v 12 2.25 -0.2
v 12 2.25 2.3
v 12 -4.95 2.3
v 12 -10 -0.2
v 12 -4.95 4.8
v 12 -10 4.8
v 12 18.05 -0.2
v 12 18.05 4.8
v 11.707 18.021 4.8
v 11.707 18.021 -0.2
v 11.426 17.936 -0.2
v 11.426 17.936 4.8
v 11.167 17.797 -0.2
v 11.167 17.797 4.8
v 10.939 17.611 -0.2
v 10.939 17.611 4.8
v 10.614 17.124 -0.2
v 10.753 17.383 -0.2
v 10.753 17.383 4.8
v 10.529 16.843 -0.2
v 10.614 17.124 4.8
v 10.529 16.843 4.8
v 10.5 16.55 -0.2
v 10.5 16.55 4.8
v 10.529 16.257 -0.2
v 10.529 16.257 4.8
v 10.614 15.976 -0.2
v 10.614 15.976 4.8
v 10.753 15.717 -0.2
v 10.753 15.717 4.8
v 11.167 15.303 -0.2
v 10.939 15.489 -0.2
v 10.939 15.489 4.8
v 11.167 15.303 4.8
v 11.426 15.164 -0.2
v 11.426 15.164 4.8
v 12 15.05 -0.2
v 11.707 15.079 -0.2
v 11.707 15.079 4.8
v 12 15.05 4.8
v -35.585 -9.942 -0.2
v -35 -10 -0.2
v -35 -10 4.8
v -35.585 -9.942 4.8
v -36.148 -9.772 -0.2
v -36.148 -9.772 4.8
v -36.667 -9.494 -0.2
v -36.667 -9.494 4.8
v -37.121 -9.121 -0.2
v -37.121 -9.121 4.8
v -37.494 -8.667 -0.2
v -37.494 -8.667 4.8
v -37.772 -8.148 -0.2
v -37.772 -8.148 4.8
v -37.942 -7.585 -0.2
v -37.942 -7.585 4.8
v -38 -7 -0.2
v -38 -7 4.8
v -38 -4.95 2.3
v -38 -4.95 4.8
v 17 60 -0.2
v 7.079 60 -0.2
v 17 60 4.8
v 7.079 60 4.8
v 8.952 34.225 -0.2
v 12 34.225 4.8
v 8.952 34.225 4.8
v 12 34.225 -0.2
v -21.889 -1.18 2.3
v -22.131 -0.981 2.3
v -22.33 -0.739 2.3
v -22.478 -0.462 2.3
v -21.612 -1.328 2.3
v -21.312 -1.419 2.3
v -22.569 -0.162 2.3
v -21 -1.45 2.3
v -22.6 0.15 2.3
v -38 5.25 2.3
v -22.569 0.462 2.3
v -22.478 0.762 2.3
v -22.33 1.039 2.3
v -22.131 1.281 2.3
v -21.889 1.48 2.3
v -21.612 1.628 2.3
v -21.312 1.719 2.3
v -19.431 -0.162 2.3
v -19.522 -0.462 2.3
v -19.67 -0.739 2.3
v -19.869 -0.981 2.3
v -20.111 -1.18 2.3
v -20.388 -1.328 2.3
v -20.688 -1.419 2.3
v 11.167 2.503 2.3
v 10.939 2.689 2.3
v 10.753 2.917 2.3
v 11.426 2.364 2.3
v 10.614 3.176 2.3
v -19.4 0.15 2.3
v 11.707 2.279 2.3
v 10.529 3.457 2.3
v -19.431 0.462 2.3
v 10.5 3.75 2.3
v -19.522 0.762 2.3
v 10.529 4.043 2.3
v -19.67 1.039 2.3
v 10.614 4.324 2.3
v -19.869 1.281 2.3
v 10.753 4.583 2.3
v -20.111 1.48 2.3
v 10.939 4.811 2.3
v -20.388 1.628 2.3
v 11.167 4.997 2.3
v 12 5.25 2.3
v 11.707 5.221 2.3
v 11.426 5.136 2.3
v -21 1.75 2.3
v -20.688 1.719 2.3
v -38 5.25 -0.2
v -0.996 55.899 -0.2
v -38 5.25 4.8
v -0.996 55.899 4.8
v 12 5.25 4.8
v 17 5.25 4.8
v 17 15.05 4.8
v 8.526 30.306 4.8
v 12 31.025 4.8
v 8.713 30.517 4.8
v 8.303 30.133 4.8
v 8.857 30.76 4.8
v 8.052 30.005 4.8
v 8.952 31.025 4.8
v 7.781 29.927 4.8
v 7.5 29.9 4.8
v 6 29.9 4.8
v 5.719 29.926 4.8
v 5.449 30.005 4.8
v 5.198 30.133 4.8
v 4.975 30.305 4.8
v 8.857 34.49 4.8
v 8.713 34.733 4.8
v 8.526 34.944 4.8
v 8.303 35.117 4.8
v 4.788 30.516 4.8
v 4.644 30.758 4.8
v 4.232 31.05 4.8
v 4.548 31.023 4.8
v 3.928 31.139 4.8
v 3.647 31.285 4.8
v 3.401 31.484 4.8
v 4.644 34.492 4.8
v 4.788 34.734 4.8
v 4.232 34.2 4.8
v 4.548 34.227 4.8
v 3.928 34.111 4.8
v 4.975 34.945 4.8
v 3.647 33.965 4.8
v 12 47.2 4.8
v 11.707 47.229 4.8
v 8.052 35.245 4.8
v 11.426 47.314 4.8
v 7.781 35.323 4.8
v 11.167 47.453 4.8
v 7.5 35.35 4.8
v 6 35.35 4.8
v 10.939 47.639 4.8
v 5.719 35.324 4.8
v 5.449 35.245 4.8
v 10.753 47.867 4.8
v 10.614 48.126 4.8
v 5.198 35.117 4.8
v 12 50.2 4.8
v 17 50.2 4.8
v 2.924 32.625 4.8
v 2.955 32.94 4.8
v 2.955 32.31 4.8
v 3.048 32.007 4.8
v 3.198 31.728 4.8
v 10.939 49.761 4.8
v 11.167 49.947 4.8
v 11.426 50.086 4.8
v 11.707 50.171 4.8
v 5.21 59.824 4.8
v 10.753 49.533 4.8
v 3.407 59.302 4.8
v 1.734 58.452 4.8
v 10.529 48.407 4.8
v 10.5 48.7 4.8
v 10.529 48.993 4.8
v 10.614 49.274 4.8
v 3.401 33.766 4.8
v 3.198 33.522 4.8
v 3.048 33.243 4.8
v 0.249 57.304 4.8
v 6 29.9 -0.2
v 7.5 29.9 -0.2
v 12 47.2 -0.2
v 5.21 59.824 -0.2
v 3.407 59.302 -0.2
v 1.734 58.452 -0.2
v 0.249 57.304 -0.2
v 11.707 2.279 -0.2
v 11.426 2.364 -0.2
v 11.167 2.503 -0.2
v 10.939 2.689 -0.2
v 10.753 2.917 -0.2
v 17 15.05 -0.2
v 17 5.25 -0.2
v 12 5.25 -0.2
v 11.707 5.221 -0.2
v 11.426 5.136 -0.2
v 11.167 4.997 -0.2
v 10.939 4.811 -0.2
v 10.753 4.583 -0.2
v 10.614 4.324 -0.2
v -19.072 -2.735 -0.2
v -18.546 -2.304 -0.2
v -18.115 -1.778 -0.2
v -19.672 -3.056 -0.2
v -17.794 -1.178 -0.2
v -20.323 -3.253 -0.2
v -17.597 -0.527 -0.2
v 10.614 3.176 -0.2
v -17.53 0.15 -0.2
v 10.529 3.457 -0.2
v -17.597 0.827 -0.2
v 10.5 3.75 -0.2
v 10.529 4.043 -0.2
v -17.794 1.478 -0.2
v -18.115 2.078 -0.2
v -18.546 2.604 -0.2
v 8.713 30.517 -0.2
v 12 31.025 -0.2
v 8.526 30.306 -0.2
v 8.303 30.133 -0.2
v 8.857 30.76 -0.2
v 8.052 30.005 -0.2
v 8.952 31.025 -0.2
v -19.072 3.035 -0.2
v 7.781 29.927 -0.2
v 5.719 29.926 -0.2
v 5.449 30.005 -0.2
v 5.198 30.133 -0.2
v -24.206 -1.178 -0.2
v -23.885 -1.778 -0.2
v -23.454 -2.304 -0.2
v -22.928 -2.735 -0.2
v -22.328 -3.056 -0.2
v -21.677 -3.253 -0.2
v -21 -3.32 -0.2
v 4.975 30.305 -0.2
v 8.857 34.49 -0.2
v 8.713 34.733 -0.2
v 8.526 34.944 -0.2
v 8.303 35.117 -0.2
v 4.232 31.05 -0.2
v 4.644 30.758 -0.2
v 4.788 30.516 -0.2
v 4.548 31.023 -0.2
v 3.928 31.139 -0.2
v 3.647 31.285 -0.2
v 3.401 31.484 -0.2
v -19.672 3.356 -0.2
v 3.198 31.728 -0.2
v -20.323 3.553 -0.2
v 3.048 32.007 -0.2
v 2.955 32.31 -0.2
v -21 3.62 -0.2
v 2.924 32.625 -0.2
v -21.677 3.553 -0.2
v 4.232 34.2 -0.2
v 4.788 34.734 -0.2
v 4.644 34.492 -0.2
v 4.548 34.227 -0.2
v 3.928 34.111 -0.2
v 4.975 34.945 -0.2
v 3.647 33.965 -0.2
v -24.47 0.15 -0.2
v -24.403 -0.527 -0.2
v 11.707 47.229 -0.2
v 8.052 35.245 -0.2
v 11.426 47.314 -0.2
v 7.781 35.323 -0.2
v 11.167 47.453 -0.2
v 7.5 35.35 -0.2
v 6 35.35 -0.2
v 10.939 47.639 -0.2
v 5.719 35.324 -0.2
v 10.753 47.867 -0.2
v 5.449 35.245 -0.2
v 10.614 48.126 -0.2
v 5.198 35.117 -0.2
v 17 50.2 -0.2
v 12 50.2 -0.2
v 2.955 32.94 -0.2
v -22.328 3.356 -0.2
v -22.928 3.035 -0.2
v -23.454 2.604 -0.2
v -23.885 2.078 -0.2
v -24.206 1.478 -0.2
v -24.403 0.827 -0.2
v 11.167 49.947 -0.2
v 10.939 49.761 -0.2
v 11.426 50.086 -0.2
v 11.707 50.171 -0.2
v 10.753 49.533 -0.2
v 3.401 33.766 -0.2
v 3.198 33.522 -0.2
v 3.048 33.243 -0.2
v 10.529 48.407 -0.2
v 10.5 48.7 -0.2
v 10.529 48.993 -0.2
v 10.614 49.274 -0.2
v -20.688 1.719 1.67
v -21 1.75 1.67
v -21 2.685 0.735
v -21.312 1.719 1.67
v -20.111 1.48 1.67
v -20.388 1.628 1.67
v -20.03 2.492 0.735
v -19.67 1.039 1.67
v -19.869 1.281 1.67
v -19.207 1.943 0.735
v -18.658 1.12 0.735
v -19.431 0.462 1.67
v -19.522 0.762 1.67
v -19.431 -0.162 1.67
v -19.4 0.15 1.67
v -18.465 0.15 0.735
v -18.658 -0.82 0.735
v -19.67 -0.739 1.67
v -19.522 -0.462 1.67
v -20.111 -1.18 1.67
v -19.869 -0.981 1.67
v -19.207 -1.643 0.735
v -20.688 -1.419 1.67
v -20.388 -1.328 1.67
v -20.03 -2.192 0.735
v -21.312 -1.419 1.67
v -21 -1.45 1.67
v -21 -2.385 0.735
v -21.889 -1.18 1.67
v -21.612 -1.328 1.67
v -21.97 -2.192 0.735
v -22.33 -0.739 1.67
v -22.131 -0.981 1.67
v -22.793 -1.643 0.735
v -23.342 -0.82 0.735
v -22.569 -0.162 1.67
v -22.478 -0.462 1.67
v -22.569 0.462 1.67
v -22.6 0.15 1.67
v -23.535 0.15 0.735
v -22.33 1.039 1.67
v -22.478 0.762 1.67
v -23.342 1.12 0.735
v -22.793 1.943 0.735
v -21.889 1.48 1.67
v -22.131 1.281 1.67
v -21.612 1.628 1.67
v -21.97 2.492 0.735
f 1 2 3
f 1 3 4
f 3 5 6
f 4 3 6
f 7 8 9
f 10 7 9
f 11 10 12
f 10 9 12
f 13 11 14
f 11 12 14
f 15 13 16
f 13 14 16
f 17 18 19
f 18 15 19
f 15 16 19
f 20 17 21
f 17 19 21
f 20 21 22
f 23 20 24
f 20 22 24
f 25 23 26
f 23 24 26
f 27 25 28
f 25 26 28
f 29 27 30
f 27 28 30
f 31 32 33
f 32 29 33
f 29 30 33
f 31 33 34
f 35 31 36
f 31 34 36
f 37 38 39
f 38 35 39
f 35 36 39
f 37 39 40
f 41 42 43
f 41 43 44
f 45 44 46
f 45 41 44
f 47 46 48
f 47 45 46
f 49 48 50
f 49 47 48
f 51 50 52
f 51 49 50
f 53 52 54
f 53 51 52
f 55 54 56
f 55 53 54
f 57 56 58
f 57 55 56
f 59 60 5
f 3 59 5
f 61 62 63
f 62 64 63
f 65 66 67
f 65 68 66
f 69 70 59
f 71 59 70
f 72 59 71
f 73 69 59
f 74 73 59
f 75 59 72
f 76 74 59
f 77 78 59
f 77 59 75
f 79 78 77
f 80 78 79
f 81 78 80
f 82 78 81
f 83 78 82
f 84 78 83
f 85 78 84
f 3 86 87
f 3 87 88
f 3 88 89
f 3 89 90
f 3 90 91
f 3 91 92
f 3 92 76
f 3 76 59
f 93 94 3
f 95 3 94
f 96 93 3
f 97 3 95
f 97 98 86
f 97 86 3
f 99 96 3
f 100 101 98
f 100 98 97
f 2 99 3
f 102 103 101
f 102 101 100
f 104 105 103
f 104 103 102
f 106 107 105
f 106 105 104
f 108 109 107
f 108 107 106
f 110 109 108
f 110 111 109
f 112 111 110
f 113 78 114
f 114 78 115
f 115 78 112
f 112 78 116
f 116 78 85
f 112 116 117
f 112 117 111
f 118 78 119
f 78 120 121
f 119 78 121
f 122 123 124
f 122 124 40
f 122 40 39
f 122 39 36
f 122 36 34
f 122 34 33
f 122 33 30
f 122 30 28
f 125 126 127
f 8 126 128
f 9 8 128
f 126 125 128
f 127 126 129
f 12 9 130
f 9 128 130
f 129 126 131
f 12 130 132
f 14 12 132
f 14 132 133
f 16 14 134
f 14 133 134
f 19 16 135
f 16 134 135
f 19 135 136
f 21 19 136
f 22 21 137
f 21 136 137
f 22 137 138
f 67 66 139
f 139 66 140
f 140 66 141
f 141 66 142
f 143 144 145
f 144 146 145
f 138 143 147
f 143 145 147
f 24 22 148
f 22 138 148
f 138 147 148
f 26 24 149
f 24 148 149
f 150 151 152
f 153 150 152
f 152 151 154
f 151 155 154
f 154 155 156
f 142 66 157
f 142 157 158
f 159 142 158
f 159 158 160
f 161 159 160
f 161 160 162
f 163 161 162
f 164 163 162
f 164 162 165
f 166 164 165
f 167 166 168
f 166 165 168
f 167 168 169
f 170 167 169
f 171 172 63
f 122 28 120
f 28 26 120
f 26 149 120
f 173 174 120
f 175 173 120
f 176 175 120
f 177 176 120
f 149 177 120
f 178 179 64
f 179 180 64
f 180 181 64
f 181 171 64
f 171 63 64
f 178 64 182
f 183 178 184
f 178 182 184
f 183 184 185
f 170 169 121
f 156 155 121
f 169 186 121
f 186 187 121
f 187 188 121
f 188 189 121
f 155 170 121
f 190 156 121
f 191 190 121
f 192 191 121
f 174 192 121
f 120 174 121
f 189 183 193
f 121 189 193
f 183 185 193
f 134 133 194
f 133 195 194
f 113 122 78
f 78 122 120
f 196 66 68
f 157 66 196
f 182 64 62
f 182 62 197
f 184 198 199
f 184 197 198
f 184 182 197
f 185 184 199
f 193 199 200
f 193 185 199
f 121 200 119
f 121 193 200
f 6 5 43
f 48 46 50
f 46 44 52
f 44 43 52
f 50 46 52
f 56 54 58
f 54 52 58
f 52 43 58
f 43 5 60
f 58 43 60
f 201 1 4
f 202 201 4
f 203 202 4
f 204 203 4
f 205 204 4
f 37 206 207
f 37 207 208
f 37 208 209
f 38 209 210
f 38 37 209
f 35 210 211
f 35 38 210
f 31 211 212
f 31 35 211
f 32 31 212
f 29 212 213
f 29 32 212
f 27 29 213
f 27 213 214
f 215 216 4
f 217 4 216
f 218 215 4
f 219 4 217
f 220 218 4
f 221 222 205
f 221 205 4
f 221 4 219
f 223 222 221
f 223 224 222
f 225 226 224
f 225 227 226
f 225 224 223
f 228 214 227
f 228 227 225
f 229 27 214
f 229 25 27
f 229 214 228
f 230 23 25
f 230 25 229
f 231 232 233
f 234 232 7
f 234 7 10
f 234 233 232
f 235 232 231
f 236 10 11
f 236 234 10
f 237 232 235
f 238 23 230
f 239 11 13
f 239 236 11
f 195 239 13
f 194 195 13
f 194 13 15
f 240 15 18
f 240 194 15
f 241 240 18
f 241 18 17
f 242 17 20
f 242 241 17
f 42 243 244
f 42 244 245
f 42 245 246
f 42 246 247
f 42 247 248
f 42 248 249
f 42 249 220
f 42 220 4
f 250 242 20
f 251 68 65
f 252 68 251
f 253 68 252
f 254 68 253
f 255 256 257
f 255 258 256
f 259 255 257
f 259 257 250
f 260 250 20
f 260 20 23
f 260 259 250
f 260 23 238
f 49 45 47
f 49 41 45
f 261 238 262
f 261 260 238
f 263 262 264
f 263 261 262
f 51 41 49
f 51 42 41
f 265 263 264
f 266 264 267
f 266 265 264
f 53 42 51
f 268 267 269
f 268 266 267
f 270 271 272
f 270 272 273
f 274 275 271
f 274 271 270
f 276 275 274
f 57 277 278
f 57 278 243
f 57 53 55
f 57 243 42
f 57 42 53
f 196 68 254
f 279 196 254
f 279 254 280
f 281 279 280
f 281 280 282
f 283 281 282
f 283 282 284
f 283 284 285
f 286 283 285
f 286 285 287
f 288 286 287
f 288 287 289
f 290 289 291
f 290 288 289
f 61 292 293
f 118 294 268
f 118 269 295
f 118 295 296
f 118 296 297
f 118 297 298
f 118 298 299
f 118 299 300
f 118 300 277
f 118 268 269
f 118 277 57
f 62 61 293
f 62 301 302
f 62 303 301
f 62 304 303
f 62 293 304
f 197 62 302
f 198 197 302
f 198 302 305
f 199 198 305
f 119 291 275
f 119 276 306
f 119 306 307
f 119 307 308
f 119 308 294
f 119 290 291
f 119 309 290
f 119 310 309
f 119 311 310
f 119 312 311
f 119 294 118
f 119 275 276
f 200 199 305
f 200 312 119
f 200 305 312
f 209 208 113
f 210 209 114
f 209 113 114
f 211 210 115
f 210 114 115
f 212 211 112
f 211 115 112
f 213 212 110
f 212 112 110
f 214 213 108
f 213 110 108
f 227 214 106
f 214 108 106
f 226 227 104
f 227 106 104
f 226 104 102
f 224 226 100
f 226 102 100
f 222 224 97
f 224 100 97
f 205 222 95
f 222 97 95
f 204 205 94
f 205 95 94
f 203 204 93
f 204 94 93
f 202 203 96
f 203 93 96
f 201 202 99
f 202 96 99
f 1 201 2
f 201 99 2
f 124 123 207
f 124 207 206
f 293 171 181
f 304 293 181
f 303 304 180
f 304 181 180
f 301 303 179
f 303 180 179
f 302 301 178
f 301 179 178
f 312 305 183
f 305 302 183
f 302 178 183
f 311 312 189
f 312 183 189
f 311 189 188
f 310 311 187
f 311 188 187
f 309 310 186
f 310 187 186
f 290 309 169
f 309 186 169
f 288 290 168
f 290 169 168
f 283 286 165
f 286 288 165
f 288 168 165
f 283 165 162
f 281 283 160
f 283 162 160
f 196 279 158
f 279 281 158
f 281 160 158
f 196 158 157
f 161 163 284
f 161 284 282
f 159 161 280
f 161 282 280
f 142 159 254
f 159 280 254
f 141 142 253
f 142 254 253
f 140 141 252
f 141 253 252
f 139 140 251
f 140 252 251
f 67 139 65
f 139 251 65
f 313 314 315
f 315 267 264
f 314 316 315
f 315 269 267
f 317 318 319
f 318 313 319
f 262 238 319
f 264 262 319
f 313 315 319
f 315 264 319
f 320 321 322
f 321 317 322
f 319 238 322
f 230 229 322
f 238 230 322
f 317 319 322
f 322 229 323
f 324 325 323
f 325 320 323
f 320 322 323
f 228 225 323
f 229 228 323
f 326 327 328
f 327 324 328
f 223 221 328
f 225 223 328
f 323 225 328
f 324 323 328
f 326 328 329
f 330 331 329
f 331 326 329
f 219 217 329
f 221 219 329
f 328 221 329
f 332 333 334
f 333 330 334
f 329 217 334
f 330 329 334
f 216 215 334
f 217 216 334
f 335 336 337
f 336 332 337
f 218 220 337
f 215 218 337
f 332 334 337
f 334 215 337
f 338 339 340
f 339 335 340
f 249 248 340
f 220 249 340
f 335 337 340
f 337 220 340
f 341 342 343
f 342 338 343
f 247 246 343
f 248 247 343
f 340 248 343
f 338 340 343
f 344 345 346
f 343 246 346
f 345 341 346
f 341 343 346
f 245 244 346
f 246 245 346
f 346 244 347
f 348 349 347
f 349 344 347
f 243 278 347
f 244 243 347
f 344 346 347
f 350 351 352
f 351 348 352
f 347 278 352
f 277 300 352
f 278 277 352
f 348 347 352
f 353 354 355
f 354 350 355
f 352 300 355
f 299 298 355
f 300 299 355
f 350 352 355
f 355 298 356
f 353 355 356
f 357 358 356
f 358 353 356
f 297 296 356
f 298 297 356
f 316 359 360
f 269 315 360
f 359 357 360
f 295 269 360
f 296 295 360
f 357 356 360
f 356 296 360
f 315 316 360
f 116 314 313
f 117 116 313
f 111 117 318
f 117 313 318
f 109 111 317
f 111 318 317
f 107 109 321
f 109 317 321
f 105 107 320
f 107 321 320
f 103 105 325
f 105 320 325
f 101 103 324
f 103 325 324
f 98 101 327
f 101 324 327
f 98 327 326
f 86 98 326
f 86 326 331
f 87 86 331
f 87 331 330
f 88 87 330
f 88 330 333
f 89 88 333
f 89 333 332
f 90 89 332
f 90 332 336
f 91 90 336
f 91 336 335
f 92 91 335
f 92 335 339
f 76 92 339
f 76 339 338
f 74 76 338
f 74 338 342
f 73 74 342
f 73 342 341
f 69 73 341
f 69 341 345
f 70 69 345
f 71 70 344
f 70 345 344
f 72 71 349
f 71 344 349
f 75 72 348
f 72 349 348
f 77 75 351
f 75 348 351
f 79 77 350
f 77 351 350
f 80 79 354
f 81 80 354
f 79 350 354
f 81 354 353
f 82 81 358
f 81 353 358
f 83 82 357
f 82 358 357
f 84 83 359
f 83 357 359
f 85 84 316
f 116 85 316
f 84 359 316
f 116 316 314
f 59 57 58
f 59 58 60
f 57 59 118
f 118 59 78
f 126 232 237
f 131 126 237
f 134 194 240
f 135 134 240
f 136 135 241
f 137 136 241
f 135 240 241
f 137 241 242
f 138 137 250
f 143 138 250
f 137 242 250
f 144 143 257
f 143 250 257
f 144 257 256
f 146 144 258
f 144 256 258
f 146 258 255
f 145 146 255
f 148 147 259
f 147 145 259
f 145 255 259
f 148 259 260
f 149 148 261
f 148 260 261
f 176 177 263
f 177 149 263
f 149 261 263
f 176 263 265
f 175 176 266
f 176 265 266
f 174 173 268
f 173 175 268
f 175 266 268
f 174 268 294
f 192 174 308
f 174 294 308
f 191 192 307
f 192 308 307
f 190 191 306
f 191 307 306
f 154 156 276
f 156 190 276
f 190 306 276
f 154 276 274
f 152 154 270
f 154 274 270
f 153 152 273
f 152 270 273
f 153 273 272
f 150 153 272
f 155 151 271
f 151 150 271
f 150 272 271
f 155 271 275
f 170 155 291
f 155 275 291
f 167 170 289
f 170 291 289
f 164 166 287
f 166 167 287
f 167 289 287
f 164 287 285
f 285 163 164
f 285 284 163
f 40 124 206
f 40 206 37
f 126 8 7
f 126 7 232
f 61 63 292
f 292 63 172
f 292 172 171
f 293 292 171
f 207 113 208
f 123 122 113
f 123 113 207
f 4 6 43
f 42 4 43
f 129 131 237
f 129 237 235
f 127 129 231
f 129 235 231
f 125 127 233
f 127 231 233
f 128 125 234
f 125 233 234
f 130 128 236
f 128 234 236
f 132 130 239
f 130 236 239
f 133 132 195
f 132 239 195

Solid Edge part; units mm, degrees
sketch "Sketch1" plane through (-10.5, 25.05, 4.8) normal (0, 0, 1) x (0, 1, 0)
  line L0 (-19.8, 27.5) -> (30.8492, -9.504)
  line L1 (-35.05, 27.5) -> (-19.8, 27.5)
  line L2 (-35.05, -22.5) -> (-35.05, 27.5)
  line L3 (-22.8, -22.5) -> (-35.05, -22.5)
  arc A0 (-22.8, -22.5) -> (-19.8, -22.5) centre (-21.3, -22.5) cw
  line L4 (-19.8, -22.5) -> (-19.8, -27.5)
  line L5 (-19.8, -27.5) -> (-10, -27.5)
  line L6 (-10, -27.5) -> (-10, -22.5)
  arc A1 (-10, -22.5) -> (-7, -22.5) centre (-8.5, -22.5) cw
  line L7 (-7, -22.5) -> (22.15, -22.5)
  arc A2 (22.15, -22.5) -> (25.15, -22.5) centre (23.65, -22.5) cw
  line L8 (25.15, -27.5) -> (25.15, -22.5)
  line L9 (34.95, -27.5) -> (25.15, -27.5)
  line L10 (34.95, -22.5) -> (34.95, -27.5)
  line L11 (34.95, -17.5786) -> (34.95, -22.5)
  arc A3 (30.8492, -9.504) -> (34.95, -17.5786) centre (24.95, -17.5786) cw
extrude "ExtrudedProtrusion_3" add sketch "Sketch1" against normal blind 5
sketch "Sketch2" plane through (-13, 0, 2.3) normal (0, 0, 1) x (0, 1, 0)
  circle A0 centre (0.15, 8) radius 1.55
  dimension "D1" = 17
  dimension "D2" = 5.1
extrude "ExtrudedCutout_14" cut sketch "Sketch2" against normal blind 5
fillet "Round_3" radius 3 1 edges at (-38, -10, 2.3)
sketch "Sketch3" plane through (-10.5, 25, -0.2) normal (0, 0, -1) x (-1, 0, 0)
  arc A0 (-19.4524, 9.225) -> (-18, 10.35) centre (-18, 8.85) cw
  line L0 (-18, 10.35) -> (-16.5, 10.35)
  arc A1 (-16.5, 10.35) -> (-15.048, 9.2266) centre (-16.5, 8.85) cw
  arc A2 (-16.5, 4.9) -> (-15.048, 6.0234) centre (-16.5, 6.4) ccw
  line L1 (-18, 4.9) -> (-16.5, 4.9)
  arc A3 (-19.4524, 6.025) -> (-18, 4.9) centre (-18, 6.4) ccw
  line L2 (-22.5, 6.025) -> (-19.4524, 6.025)
  line L3 (-22.5, 7.625) -> (-22.5, 6.025)
  line L4 (-22.5, 7.625) -> (-22.5, 9.225)
  line L5 (-22.5, 9.225) -> (-19.4524, 9.225)
  arc A4 (-15.048, 9.2265) -> (-15.048, 6.0235) centre (-15.0254, 7.625) cw
extrude "Cutout1" cut sketch "Sketch3" against normal blind 5
sketch "Sketch4" plane through (-10.5, 25, 4.8) normal (0, 0, 1) x (0.5899241, 0.8074587, 0)
  line L0 (-2.674, -29.8188) -> (-32.1702, 10.5541)
  line L1 (-32.1702, 10.5541) -> (-40.4063, 4.5369)
  line L2 (-40.4063, 4.5369) -> (-10.9101, -35.836)
  line L3 (-10.9101, -35.836) -> (-2.674, -29.8188)
extrude "ExtrudedCutout_16" cut sketch "Sketch4" against normal blind 2.5
hole "Hole_4" at (-21, 0.15, -0.2) direction (0, 0, 1) diameter 3.2 end up to next countersink diameter 6.94 countersink angle 90
properties material "Polycarbonate"
